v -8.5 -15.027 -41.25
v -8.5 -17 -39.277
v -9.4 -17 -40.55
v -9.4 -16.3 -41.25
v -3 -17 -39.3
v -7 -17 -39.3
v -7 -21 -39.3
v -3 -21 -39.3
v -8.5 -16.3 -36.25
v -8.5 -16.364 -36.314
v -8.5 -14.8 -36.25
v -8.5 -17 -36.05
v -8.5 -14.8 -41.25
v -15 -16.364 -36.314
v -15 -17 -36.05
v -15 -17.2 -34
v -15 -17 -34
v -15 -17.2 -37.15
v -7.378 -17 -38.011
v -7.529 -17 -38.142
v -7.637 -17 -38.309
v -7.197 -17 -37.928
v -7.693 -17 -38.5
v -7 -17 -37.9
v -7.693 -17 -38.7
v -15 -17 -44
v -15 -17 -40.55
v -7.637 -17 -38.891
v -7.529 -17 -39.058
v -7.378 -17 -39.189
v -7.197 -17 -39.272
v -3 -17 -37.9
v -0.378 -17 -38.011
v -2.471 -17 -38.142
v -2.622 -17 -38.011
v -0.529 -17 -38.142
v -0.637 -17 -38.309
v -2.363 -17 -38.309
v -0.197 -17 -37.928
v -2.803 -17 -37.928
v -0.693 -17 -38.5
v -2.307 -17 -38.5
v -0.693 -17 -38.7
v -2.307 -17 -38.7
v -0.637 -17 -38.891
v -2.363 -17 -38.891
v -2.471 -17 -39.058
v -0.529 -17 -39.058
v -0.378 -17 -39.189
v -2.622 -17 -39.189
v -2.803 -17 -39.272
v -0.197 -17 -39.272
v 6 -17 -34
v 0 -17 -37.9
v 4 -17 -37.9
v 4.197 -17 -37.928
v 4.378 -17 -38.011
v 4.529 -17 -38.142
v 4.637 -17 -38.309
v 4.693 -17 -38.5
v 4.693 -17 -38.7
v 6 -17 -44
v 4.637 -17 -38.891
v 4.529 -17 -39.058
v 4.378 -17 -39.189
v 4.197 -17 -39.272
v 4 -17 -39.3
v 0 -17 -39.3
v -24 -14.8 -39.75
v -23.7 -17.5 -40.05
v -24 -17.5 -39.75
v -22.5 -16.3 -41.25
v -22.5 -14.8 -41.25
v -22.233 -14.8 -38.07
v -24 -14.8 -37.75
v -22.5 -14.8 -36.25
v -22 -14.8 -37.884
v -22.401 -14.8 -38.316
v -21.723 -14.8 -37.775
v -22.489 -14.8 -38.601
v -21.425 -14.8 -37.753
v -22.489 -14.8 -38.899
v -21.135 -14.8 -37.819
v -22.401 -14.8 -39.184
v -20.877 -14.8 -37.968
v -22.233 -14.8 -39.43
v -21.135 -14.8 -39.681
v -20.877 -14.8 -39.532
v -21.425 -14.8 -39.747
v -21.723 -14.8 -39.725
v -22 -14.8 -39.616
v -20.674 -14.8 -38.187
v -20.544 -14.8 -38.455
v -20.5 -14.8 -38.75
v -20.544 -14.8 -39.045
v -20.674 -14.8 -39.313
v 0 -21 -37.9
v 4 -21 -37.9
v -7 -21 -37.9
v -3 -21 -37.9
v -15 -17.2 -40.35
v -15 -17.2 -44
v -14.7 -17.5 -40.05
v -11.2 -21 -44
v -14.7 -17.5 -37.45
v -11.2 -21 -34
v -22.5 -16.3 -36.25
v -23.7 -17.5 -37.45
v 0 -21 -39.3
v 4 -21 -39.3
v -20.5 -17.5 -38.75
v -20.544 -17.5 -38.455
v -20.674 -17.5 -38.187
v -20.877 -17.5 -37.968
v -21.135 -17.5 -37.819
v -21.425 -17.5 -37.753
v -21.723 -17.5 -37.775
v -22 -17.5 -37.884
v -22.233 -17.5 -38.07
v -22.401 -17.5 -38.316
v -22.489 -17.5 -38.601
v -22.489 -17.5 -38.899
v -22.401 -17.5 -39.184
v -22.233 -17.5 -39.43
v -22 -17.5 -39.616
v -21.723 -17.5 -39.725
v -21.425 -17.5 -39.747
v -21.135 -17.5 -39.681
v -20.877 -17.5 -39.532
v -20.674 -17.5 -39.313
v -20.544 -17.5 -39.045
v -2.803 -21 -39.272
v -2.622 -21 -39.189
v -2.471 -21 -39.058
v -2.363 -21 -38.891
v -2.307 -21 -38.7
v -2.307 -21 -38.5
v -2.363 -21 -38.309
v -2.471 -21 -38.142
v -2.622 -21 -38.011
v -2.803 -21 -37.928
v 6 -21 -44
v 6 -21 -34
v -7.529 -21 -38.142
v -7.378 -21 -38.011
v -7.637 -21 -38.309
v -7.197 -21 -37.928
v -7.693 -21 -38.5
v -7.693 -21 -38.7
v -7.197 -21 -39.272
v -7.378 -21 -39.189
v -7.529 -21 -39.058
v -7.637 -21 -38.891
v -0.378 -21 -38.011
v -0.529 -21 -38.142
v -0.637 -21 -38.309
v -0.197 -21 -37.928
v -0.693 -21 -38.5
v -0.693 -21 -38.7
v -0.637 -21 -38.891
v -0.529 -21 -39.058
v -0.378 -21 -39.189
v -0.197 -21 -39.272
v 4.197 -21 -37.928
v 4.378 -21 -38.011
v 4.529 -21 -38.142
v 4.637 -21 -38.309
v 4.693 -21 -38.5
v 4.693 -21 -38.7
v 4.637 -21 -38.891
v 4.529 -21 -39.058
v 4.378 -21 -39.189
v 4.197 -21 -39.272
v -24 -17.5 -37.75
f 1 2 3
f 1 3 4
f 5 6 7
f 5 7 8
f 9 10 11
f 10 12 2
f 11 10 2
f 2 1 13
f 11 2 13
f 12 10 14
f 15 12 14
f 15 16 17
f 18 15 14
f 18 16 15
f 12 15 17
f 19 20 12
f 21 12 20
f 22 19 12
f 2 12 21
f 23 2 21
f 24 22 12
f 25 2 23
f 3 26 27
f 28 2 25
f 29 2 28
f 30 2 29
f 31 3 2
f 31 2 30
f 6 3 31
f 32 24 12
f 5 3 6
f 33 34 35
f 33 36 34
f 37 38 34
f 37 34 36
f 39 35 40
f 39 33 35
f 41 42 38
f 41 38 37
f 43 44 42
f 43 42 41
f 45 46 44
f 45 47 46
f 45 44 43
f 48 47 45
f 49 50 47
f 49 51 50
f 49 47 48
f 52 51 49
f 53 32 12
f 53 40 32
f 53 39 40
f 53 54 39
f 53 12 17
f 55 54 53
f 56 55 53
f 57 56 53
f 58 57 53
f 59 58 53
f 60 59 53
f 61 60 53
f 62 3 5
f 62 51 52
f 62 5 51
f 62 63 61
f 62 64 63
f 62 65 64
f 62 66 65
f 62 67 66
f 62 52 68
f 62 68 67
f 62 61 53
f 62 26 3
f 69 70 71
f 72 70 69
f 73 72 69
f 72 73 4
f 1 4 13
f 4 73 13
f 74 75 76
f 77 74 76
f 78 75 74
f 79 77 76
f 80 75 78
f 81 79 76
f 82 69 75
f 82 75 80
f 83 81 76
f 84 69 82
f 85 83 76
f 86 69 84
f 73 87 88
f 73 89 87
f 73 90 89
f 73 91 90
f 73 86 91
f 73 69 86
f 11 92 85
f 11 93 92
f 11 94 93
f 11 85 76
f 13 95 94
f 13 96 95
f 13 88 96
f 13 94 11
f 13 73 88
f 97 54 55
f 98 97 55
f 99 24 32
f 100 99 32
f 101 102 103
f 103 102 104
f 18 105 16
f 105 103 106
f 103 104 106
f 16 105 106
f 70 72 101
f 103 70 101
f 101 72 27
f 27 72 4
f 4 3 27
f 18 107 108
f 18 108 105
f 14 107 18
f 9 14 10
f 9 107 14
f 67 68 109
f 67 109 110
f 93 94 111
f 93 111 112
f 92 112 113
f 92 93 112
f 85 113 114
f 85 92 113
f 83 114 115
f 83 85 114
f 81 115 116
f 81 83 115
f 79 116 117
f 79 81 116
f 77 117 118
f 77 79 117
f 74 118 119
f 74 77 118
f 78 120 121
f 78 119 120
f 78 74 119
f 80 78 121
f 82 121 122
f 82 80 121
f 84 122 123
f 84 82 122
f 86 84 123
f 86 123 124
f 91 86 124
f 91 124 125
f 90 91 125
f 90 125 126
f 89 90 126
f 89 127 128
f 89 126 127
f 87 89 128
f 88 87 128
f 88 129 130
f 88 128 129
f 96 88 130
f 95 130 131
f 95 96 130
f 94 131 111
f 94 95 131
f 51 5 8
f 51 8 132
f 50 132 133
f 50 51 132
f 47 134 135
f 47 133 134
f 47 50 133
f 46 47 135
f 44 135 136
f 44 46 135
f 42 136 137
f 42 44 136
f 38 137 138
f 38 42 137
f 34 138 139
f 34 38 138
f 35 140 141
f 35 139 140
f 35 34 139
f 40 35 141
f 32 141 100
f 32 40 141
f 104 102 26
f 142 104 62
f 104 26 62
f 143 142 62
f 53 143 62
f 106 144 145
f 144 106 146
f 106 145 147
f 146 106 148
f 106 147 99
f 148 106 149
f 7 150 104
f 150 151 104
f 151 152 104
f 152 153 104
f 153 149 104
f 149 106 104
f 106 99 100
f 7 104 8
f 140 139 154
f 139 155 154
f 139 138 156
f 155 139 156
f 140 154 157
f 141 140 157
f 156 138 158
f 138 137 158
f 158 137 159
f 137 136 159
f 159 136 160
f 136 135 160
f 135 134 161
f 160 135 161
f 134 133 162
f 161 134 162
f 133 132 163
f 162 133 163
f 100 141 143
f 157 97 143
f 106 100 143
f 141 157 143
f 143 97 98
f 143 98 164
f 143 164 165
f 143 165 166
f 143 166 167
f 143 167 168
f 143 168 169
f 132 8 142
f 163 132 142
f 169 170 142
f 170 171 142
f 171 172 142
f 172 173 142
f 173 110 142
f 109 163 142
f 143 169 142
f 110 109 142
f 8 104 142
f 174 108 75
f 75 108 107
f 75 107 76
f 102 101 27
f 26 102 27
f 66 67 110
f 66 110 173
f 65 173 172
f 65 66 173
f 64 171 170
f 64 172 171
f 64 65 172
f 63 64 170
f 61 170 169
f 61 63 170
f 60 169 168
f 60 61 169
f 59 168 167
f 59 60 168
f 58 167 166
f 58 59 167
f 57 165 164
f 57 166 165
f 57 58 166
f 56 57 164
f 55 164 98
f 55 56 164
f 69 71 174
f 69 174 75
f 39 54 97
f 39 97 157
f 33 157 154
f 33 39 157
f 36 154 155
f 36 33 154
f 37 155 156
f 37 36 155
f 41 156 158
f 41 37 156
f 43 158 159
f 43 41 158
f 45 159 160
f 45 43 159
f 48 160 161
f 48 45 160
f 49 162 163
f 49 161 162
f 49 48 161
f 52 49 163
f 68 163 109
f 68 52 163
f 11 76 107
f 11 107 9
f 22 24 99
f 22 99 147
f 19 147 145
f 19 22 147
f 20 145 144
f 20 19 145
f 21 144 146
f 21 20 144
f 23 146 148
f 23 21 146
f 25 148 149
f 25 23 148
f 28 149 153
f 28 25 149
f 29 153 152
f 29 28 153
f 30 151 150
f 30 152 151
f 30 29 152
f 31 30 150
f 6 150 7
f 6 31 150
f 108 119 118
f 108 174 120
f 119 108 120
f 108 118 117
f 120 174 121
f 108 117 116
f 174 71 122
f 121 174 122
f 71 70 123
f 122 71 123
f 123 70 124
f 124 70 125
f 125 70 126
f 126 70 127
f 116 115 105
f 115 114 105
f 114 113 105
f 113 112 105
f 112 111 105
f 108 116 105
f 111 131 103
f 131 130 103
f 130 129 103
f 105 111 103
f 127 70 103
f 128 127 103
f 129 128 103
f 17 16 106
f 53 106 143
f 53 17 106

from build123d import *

# Parameters (mm, degrees)
BOX012_W               = 4
BOX012_H               = 10
BOX012_DEPTH           = 1.4
CYLINDER012_R          = 0.7
CYLINDER012_DEPTH      = 10
CYLINDER012_ROLL_ANGLE = 90
CYLINDER013_R          = 0.7
CYLINDER013_DEPTH      = 10
CYLINDER013_ROLL_ANGLE = 90
BOX011_W               = 21
BOX011_H               = 4
BOX011_DEPTH           = 10
CHAMFER003_SIZE        = 3.8
CYLINDER014_R          = 1
CYLINDER014_DEPTH      = 5
CYLINDER014_ROLL_ANGLE = 90
BOX010_W               = 15.5
BOX010_H               = 2.7
BOX010_DEPTH           = 5
CHAMFER001_SIZE        = 1.5
CHAMFER002_SIZE        = 1.2
CHAMFER004_SIZE        = 0.9


with BuildPart() as cube007:
    # Box012 → Box012 (new body)
    with BuildSketch(Plane(origin=(-7, -24.5, -39.3), x_dir=(1, 0, 0), z_dir=(0, 0, 1))):
        with Locations((2, 5)):
            Rectangle(BOX012_W, BOX012_H)
    extrude(amount=BOX012_DEPTH)


with BuildPart() as cylinder003:
    # Cylinder012 → Cylinder012 (new body)
    with BuildSketch(Plane.XY):
        Circle(CYLINDER012_R)
    extrude(amount=CYLINDER012_DEPTH)


with BuildPart() as cylinder003_1:
    # Cylinder012 roll: moved
    add(cylinder003.part.rotate(Axis((0, 0, 0), (1, 0, 0)), CYLINDER012_ROLL_ANGLE))


with BuildPart() as cylinder003_2:
    # Cylinder012 placement: moved
    add(cylinder003_1.part.moved(Location((-3, -14.5, -38.6))))


with BuildPart() as cylinder004:
    # Cylinder013 → Cylinder013 (new body)
    with BuildSketch(Plane.XY):
        Circle(CYLINDER013_R)
    extrude(amount=CYLINDER013_DEPTH)


with BuildPart() as cylinder004_1:
    # Cylinder013 roll: moved
    add(cylinder004.part.rotate(Axis((0, 0, 0), (1, 0, 0)), CYLINDER013_ROLL_ANGLE))


with BuildPart() as cylinder004_2:
    # Cylinder013 placement: moved
    add(cylinder004_1.part.moved(Location((-7, -14.5, -38.6))))


with BuildPart() as fusion007005:
    # Fusion007005 base: copy of Cylinder004
    add(cylinder004_2.part)

    # Fusion007005: union Cube007, Cylinder003
    add(cube007.part)
    add(cylinder003_2.part)


with BuildPart() as fusion007005_1:
    # Fusion007005 placement: moved
    add(fusion007005.part.moved(Location((7, 0, 0))))


with BuildPart() as fusion007006:
    # Fusion007006 base: copy of Cylinder004
    add(cylinder004_2.part)

    # Fusion007006: union Cube007, Cylinder003
    add(cube007.part)
    add(cylinder003_2.part)


with BuildPart() as chamfer003:
    # Box011 → Box011 (new body)
    with BuildSketch(Plane(origin=(-15, -21, -44), x_dir=(1, 0, 0), z_dir=(0, 0, 1))):
        with Locations((10.5, 2)):
            Rectangle(BOX011_W, BOX011_H)
    extrude(amount=BOX011_DEPTH)

    # Cut007: cut Fusion007006
    add(fusion007006.part, mode=Mode.SUBTRACT)

    # Cut008: cut Fusion007005
    add(fusion007005_1.part, mode=Mode.SUBTRACT)

    # Chamfer003
    chamfer003_edges = [chamfer003.edges().sort_by_distance(p)[0] for p in [
        (-15, -21, -39),
    ]]
    chamfer(chamfer003_edges, length=CHAMFER003_SIZE)


with BuildPart() as cylinder005:
    # Cylinder014 → Cylinder014 (new body)
    with BuildSketch(Plane.XY):
        Circle(CYLINDER014_R)
    extrude(amount=CYLINDER014_DEPTH)


with BuildPart() as cylinder005_1:
    # Cylinder014 roll: moved
    add(cylinder005.part.rotate(Axis((0, 0, 0), (1, 0, 0)), CYLINDER014_ROLL_ANGLE))


with BuildPart() as cylinder005_2:
    # Cylinder014 placement: moved
    add(cylinder005_1.part.moved(Location((-21.5, -13.5, -38.75))))


with BuildPart() as chamfer004:
    # Box010 → Box010 (new body)
    with BuildSketch(Plane(origin=(-24, -17.5, -41.25), x_dir=(1, 0, 0), z_dir=(0, 0, 1))):
        with Locations((7.75, 1.35)):
            Rectangle(BOX010_W, BOX010_H)
    extrude(amount=BOX010_DEPTH)

    # Cut009: cut Cylinder005
    add(cylinder005_2.part, mode=Mode.SUBTRACT)

    # Chamfer001
    chamfer001_edges = [chamfer004.edges().sort_by_distance(p)[0] for p in [
        (-24, -16.15, -36.25),
        (-24, -16.15, -41.25),
    ]]
    chamfer(chamfer001_edges, length=CHAMFER001_SIZE)

    # Chamfer002
    chamfer002_edges = [chamfer004.edges().sort_by_distance(p)[0] for p in [
        (-15.5, -17.5, -41.25),
        (-15.5, -17.5, -36.25),
    ]]
    chamfer(chamfer002_edges, length=CHAMFER002_SIZE)

    # Fusion007007: union Chamfer003
    add(chamfer003.part)

    # Chamfer004
    chamfer004_edges = [chamfer004.edges().sort_by_distance(p)[0] for p in [
        (-11.75, -17, -36.95),
        (-8.5, -16.65, -40.9),
    ]]
    chamfer(chamfer004_edges, length=CHAMFER004_SIZE)


solid = chamfer004.part
